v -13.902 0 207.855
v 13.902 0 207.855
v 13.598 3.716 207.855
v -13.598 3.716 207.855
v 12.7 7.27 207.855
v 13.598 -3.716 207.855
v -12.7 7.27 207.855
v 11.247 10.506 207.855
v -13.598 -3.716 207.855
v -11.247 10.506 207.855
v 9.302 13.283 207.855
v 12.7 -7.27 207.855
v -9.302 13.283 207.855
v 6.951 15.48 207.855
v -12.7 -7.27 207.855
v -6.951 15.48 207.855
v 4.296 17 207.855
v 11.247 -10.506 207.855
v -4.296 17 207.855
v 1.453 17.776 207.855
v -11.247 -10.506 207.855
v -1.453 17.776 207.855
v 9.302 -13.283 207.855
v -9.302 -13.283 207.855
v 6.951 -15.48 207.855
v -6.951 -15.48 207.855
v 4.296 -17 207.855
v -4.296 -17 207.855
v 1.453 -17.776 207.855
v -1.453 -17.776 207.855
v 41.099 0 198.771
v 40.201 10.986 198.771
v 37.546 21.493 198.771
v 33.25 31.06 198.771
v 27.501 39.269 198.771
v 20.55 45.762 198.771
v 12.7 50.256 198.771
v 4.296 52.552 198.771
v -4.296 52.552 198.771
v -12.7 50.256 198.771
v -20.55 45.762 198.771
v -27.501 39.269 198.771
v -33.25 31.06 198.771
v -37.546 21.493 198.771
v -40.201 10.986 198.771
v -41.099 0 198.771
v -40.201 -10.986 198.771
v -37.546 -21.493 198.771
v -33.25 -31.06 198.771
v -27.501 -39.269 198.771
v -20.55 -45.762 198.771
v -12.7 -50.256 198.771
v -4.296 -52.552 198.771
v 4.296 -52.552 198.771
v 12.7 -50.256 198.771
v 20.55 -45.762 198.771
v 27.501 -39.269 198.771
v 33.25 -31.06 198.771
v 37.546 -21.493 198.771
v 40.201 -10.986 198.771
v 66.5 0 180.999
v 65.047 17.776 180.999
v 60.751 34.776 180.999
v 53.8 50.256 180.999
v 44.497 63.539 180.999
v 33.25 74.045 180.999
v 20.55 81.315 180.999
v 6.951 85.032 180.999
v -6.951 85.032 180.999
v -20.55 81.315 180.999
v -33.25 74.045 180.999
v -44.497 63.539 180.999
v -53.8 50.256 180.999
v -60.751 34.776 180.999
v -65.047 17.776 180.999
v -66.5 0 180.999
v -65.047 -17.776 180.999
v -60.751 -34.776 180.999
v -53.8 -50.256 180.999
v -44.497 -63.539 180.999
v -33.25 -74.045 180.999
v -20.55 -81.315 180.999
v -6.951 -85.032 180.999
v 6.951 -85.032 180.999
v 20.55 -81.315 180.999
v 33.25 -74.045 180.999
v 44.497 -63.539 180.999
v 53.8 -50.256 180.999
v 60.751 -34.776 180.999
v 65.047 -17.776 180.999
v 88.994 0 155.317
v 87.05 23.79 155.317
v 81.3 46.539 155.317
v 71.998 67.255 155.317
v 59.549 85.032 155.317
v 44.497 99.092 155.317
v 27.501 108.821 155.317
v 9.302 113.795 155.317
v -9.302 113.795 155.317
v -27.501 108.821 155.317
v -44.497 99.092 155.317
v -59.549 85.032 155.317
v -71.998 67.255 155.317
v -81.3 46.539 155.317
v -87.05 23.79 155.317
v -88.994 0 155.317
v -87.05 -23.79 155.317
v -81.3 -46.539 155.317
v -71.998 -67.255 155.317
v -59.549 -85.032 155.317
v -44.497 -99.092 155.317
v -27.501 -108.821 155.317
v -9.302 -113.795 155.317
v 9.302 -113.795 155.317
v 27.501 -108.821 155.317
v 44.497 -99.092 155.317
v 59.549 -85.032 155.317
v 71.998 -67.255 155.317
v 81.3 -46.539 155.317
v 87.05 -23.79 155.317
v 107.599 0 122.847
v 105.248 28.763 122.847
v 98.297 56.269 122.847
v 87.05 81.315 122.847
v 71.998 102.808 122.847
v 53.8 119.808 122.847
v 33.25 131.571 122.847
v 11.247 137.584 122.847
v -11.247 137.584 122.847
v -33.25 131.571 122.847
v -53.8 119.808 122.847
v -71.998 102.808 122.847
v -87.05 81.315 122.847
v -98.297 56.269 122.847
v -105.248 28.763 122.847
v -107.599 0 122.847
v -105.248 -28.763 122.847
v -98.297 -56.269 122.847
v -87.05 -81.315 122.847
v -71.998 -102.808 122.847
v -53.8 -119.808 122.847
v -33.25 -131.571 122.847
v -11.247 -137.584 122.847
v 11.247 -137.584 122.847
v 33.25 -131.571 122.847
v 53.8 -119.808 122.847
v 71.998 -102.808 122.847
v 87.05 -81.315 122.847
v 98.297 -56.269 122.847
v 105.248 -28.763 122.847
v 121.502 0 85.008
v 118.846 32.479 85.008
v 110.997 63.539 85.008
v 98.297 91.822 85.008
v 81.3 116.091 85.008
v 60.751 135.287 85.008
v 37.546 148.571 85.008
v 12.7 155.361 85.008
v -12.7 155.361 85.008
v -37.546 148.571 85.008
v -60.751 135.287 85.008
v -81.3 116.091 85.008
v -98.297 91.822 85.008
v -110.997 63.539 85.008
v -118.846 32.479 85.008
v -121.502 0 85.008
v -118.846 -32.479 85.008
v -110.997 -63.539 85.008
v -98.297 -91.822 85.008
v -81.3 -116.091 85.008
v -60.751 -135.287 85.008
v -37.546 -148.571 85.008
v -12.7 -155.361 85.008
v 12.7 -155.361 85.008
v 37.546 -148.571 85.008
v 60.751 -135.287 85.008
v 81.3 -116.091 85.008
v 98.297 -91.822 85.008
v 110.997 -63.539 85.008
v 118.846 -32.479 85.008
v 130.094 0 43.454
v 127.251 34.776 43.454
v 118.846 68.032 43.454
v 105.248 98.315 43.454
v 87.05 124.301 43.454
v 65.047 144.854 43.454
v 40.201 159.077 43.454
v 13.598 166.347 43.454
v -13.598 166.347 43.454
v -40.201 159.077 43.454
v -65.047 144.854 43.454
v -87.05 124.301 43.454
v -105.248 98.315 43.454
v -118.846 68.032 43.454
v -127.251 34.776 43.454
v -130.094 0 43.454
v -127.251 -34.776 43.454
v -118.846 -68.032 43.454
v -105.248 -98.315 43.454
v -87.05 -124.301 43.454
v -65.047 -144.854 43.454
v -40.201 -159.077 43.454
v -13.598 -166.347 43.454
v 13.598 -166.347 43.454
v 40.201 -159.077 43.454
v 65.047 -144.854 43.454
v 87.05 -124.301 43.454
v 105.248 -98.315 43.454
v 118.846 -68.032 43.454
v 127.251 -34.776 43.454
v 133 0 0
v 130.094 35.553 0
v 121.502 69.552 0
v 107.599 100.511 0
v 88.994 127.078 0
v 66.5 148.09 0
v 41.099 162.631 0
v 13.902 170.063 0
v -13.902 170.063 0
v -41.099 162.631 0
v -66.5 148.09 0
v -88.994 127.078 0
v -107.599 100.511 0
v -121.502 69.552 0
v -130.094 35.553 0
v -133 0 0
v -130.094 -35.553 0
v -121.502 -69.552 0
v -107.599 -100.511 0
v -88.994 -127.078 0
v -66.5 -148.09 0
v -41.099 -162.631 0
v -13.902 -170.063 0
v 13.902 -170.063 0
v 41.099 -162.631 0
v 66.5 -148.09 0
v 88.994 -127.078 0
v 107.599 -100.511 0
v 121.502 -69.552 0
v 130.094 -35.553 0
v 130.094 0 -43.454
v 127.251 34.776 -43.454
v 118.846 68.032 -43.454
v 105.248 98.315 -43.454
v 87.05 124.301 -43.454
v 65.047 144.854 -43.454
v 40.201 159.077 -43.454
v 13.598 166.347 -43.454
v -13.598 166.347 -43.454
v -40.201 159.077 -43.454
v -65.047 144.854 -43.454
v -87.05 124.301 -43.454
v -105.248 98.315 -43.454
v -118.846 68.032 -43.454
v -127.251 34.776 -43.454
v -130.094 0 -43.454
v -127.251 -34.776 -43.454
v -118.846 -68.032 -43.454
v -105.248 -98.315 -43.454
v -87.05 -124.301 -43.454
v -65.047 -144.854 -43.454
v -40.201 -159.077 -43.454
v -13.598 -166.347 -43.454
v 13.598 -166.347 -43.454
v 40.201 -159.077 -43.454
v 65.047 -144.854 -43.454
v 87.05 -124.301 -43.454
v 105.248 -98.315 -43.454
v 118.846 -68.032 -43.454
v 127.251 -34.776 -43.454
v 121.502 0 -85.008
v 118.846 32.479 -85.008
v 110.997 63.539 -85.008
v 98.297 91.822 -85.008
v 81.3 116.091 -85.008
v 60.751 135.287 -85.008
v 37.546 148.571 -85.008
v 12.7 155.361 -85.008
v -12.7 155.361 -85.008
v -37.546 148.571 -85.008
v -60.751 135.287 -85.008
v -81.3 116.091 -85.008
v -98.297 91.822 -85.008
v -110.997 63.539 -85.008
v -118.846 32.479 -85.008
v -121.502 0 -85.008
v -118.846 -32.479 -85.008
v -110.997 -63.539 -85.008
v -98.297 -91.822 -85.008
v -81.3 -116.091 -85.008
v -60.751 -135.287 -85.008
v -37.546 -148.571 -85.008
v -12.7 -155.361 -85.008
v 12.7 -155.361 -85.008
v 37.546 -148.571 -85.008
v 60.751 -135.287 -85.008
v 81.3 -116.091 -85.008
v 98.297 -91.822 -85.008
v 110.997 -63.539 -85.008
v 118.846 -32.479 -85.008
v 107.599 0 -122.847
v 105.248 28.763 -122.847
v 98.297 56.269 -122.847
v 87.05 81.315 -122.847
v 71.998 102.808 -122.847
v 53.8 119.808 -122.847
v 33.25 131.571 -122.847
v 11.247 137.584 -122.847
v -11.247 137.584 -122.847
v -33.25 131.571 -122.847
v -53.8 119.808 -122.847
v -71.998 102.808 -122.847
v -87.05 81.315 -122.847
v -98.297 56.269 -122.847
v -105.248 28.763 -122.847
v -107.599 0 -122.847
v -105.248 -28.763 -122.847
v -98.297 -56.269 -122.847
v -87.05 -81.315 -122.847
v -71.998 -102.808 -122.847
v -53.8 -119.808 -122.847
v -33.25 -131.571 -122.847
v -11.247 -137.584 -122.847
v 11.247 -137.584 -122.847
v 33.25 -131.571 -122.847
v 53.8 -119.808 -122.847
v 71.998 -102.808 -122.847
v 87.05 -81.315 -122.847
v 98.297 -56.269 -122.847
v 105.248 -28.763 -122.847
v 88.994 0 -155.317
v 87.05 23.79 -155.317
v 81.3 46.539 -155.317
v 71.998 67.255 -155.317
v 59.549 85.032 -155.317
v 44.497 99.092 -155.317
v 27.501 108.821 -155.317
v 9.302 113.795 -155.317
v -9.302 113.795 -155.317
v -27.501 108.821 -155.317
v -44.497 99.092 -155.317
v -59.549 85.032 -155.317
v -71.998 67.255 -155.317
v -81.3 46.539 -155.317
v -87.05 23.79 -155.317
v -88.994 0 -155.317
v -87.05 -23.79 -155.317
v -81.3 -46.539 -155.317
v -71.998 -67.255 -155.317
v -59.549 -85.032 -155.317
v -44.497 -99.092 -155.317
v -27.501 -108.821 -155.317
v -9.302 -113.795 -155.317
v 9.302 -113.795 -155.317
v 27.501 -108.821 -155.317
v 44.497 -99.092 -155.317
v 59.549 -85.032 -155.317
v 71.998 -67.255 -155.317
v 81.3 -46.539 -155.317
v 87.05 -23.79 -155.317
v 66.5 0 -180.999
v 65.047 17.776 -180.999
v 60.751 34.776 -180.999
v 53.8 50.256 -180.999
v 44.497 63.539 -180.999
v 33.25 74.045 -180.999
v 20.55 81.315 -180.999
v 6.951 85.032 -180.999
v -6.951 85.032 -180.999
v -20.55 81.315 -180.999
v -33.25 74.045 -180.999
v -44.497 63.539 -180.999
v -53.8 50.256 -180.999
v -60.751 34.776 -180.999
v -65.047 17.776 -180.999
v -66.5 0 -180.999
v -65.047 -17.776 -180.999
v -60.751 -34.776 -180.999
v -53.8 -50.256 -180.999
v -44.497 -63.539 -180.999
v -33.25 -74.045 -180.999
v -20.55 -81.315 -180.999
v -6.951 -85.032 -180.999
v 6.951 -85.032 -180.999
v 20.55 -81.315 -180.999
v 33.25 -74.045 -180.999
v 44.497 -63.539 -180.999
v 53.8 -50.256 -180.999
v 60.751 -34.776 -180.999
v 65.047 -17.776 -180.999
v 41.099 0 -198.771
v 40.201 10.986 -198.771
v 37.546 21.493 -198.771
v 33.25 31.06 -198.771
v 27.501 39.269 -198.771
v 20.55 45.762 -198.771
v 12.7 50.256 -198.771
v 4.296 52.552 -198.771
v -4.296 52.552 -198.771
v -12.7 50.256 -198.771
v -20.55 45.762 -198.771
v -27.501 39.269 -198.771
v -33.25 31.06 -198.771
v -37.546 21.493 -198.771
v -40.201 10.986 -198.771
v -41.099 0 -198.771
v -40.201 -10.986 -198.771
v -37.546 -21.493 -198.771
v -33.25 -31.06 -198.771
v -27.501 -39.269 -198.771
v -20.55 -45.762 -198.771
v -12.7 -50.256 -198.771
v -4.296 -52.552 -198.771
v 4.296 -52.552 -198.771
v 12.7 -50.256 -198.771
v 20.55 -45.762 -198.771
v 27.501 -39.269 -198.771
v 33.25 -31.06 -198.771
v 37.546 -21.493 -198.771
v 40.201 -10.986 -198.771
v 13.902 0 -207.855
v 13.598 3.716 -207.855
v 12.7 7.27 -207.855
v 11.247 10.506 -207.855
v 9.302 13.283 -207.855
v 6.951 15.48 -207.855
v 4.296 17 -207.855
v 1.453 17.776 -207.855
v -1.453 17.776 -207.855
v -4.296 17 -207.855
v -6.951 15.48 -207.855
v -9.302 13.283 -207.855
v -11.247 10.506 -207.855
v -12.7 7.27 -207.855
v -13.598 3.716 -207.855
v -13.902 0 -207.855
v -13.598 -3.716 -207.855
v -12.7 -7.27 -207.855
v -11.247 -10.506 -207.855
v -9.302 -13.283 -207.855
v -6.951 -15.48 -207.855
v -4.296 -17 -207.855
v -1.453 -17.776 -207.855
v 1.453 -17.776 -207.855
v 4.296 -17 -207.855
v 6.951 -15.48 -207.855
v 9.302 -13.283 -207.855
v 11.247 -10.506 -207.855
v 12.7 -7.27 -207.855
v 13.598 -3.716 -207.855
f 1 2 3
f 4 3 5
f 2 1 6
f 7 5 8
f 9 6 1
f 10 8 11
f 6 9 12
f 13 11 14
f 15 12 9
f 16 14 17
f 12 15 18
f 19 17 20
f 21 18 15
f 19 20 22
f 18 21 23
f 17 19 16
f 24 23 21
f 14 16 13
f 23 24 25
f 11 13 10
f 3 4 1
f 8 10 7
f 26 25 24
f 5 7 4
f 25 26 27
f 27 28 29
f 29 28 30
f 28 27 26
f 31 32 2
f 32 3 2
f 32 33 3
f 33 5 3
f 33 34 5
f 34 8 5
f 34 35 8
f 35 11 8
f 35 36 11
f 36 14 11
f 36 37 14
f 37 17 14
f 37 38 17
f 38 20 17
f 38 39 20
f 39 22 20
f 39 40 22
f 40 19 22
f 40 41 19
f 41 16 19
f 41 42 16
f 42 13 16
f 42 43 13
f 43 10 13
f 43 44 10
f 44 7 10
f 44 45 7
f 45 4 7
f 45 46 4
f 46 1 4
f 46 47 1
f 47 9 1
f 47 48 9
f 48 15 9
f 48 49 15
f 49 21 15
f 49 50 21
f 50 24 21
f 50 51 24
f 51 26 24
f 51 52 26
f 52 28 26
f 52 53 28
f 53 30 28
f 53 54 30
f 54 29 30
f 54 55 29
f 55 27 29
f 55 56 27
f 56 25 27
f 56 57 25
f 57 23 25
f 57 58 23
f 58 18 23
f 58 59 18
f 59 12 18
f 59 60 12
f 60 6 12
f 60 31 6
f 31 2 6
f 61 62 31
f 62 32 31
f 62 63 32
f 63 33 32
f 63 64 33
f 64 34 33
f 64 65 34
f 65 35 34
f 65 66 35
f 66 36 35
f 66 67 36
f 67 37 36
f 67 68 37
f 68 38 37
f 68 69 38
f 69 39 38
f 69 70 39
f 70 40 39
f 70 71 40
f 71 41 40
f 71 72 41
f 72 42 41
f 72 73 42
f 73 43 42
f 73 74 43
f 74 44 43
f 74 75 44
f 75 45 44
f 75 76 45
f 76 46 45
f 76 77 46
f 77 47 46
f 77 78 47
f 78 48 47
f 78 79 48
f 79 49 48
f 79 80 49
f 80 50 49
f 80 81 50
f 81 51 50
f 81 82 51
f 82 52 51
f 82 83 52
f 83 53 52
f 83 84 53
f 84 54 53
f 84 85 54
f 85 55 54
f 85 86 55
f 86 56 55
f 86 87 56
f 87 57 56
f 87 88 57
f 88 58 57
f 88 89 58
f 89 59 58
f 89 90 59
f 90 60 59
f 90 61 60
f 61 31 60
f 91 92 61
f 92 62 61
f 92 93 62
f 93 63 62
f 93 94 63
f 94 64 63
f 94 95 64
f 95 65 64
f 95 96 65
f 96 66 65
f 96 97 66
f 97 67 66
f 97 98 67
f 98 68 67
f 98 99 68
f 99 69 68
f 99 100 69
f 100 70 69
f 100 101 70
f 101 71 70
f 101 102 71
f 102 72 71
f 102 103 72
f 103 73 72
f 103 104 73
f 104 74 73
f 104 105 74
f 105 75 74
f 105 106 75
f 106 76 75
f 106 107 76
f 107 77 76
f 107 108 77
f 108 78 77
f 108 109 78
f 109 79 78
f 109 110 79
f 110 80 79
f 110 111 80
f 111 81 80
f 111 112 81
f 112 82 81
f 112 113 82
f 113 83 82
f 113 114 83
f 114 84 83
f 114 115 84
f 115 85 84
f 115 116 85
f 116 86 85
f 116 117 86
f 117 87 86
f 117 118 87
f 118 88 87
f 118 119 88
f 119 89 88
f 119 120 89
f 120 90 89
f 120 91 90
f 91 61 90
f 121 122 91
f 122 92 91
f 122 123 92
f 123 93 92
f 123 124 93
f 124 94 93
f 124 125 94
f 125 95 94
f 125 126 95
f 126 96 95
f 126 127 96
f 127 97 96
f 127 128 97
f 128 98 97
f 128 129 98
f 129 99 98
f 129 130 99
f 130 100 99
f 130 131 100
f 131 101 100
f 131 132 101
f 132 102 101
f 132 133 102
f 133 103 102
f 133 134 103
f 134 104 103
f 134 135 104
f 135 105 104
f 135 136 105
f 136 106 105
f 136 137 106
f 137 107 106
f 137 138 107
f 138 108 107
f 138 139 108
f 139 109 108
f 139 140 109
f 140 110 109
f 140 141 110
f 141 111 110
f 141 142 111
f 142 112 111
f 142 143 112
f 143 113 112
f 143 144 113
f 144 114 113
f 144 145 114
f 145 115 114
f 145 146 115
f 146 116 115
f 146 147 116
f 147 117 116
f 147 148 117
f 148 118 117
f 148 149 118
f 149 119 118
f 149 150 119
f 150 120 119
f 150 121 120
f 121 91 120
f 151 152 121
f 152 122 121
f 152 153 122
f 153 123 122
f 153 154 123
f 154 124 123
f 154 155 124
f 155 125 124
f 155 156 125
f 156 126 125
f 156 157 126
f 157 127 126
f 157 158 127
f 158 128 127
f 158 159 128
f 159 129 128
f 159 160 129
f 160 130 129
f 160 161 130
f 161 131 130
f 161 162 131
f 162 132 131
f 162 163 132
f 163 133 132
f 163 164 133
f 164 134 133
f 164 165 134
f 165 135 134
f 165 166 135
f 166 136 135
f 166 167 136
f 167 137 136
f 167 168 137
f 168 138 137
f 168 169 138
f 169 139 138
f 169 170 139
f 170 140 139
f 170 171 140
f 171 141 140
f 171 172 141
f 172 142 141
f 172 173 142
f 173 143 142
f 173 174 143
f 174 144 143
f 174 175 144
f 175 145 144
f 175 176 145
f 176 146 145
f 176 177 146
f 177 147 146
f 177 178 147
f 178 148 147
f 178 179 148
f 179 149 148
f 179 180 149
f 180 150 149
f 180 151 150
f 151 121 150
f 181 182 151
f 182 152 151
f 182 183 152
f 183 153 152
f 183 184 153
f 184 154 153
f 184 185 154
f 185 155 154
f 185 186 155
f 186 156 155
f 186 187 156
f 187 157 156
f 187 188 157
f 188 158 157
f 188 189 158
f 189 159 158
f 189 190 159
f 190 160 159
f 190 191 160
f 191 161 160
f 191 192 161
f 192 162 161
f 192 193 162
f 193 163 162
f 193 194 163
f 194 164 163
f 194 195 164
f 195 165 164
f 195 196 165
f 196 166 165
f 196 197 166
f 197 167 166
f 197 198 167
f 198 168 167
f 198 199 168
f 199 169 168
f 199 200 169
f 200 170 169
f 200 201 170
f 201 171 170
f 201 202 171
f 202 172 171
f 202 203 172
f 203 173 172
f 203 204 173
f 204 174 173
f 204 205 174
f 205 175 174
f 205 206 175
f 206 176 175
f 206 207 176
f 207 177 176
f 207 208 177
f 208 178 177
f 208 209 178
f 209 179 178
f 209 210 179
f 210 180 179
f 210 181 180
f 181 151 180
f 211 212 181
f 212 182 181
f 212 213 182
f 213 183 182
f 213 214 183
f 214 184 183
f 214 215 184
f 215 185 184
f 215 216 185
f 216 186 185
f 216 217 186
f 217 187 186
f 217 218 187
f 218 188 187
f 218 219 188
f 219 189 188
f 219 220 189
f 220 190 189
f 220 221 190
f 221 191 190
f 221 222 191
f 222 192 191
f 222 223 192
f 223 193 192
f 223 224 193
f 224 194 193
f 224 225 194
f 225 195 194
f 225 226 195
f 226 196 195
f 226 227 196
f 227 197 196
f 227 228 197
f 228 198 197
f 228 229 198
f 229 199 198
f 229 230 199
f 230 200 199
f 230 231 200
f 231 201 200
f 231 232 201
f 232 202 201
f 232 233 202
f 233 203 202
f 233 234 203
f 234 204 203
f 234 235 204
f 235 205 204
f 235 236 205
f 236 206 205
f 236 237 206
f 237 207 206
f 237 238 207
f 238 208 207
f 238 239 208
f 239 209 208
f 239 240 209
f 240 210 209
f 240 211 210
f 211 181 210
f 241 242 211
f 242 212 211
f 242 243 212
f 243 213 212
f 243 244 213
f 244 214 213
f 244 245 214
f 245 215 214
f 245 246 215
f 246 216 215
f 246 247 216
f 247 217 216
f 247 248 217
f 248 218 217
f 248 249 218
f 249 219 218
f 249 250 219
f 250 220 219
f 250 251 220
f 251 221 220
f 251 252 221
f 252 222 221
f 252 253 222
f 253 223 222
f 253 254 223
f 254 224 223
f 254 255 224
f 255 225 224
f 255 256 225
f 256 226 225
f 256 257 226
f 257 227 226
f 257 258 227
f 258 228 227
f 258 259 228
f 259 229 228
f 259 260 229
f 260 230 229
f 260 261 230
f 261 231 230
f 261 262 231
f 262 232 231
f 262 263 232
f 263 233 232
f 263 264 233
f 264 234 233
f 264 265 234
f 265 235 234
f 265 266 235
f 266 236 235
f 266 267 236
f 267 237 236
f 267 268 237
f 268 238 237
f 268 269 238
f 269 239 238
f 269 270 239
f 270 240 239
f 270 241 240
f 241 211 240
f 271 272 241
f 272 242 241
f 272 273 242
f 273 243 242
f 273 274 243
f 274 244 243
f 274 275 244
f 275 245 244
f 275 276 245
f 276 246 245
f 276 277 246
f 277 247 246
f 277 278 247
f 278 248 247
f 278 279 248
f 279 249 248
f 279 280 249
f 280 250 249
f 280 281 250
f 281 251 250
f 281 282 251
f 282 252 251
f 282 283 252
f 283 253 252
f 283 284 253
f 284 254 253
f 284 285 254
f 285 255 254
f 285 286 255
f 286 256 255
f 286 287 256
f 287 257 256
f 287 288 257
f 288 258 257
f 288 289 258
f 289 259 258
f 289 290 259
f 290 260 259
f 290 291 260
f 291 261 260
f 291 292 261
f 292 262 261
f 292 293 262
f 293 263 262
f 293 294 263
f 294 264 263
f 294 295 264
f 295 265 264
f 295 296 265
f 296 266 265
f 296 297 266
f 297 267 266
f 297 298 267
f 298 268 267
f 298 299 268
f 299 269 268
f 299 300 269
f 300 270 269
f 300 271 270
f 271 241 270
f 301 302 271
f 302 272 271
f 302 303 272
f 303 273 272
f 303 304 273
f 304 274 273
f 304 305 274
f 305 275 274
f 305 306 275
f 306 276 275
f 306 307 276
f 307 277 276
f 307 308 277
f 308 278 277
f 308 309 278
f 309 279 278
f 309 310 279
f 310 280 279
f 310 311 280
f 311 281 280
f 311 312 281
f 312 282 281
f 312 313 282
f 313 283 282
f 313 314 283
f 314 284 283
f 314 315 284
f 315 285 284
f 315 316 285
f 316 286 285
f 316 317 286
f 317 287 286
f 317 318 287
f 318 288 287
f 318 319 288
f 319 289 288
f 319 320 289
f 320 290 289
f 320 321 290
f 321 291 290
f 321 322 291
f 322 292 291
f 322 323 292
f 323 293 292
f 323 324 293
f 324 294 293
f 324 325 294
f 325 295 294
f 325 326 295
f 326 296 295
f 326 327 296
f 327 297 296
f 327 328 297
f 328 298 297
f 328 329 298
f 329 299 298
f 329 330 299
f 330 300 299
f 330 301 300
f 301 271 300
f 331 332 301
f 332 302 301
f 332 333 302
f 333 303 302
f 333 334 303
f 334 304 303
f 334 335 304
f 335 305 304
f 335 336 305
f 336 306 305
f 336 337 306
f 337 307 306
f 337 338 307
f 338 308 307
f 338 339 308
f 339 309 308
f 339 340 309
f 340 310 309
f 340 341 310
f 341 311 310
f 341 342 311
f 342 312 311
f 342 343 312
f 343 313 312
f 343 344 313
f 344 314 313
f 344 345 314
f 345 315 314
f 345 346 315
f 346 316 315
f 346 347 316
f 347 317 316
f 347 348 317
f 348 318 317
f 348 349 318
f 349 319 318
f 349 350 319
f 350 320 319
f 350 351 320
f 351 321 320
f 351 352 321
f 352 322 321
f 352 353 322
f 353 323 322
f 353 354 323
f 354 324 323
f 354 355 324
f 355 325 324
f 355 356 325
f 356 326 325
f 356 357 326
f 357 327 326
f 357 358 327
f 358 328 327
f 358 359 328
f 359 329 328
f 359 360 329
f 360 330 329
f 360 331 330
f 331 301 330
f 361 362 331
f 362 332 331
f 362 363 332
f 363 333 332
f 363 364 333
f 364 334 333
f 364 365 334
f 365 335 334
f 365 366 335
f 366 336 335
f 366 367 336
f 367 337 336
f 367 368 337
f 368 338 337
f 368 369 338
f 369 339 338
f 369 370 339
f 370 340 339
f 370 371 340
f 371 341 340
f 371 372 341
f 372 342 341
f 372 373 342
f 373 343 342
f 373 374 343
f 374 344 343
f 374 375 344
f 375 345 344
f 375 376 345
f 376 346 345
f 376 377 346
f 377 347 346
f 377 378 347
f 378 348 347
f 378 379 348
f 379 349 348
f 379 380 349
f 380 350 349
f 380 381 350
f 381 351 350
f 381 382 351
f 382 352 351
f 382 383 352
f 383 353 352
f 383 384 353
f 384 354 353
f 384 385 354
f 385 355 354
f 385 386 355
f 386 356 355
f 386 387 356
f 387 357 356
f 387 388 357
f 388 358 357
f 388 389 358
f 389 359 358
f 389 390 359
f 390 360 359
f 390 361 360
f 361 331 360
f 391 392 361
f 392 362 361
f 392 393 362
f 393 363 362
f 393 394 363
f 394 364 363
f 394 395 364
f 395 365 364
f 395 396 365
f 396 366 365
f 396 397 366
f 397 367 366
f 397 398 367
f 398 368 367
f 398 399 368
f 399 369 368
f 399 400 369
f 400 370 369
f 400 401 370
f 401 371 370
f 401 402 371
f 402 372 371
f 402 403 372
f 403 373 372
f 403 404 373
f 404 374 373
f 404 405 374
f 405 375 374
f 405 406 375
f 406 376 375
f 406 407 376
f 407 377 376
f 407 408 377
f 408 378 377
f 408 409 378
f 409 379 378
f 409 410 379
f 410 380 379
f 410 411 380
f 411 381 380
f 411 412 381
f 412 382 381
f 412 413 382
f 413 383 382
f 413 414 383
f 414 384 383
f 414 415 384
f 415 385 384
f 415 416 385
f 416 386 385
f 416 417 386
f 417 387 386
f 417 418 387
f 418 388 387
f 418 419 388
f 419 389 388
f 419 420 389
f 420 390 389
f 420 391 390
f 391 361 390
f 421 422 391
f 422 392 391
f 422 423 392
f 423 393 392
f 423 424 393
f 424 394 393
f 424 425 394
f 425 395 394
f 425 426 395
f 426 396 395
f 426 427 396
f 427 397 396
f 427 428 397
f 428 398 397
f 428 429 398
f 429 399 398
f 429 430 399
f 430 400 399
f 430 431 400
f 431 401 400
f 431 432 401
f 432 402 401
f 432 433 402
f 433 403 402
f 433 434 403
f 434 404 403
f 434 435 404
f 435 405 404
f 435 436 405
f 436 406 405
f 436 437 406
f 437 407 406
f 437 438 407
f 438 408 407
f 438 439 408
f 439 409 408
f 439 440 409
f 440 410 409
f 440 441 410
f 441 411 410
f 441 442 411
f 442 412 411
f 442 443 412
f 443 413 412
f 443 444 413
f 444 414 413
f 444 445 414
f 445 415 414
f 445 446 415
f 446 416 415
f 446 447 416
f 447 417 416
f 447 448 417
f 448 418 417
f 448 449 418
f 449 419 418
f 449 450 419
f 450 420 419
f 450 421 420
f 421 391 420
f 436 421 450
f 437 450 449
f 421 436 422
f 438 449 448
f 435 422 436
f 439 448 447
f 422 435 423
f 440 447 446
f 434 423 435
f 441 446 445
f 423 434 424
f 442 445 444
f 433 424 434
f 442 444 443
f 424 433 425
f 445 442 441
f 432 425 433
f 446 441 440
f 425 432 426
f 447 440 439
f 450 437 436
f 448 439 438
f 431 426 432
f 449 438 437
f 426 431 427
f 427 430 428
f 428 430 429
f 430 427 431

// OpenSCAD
// Generated by SolidPython 1.0.1 on 2020-07-29 00:39:26


scale(v = [7, 9, 11]) {
	sphere(r = 19);
}
/***********************************************
*********      SolidPython code:      **********
************************************************
 
# import packages: SolidPython
from solid import *
from solid.utils import *
from itertools import chain, combinations


class Resize:

    def __init__(self, scad_file):
        self.scad_file = scad_file
        #self.scad_file = import_scad(scad_file)
        # cone/cylinder param:
        self.r1 = 0
        self.r2 = 0
        self.h = 0
        # rectangular prism param:
        self.w = 0
        self.l = 0
        # ellipse param:
        self.r = 0

    # import OpenScad code (file name corresponds to shape)


    # classify shape + parameters
    def assign(self, param1, param2, param3):
        if self.scad_file == 'cone.scad':
            self.r1 = param1
            self.r2 = param2
            self.h = param3
        elif self.scad_file == 'cylinder.scad':
            self.r1 = param1
            self.r2 = param2
            self.h = param3
        elif self.scad_file == 'rectangularPrism.scad':
            self.h = param1
            self.l = param2
            self.w = param3
        else:
            self.r = param1
            self.h = param2

    # resize parameters
    def iterate(self):
        x = range(3, 20, 2)
        i = 1
        if self.scad_file == 'cone.scad':
            tempList = list(combinations(x, 2))
            for temp in tempList:
                param1 = temp[0]
                param2 = temp[1]
                filepath = 'produced_scad_files/' + 'cone' + str(param1) + '_' + str(param2) + '_' + '.scad'
                scad_render_to_file(cylinder(h=param1, r1=param2, r2=0), filepath)

        elif self.scad_file == 'cylinder.scad':
            tempList = list(combinations(x, 3))
            for temp in tempList:
                param1 = temp[0]
                param2 = temp[1]
                filepath = 'produced_scad_files/' + 'cylinder' + str(param1) + '_' + str(param2) + '_' + '.scad'
                scad_render_to_file(cylinder(h=param1, r1=param2, r2=param2), filepath)

        elif self.scad_file == 'rectangularPrism.scad':
            tempList = list(combinations(x, 3))
            for temp in tempList:
                param1 = temp[0]
                param2 = temp[1]
                param3 = temp[2]
                filepath = 'produced_scad_files/' + 'rectangularPrism' + str(param1) + '_' + str(param2) + '_' + str(
                    param3) + '.scad'
                scad_render_to_file(cube(size=(param1, param2, param3)), filepath)

        elif self.scad_file == 'ellipse.scad':
            tempList = list(combinations(x, 4))
            for temp in tempList:
                param1 = temp[0]
                param2 = temp[1]
                param3 = temp[2]
                param4 = temp[3]
                filepath = 'produced_scad_files/' + 'ellipse' + str(param1) + '_' + str(param2) + '_' + str(param3) + '_' + str(param4) + '.scad'
                scad_render_to_file(scale([param1, param2, param3])(sphere(r=param4)), filepath)

    def render_to_scadfile(self):
        scad_render_to_file(scad, 'example.scad') 
 
************************************************/
